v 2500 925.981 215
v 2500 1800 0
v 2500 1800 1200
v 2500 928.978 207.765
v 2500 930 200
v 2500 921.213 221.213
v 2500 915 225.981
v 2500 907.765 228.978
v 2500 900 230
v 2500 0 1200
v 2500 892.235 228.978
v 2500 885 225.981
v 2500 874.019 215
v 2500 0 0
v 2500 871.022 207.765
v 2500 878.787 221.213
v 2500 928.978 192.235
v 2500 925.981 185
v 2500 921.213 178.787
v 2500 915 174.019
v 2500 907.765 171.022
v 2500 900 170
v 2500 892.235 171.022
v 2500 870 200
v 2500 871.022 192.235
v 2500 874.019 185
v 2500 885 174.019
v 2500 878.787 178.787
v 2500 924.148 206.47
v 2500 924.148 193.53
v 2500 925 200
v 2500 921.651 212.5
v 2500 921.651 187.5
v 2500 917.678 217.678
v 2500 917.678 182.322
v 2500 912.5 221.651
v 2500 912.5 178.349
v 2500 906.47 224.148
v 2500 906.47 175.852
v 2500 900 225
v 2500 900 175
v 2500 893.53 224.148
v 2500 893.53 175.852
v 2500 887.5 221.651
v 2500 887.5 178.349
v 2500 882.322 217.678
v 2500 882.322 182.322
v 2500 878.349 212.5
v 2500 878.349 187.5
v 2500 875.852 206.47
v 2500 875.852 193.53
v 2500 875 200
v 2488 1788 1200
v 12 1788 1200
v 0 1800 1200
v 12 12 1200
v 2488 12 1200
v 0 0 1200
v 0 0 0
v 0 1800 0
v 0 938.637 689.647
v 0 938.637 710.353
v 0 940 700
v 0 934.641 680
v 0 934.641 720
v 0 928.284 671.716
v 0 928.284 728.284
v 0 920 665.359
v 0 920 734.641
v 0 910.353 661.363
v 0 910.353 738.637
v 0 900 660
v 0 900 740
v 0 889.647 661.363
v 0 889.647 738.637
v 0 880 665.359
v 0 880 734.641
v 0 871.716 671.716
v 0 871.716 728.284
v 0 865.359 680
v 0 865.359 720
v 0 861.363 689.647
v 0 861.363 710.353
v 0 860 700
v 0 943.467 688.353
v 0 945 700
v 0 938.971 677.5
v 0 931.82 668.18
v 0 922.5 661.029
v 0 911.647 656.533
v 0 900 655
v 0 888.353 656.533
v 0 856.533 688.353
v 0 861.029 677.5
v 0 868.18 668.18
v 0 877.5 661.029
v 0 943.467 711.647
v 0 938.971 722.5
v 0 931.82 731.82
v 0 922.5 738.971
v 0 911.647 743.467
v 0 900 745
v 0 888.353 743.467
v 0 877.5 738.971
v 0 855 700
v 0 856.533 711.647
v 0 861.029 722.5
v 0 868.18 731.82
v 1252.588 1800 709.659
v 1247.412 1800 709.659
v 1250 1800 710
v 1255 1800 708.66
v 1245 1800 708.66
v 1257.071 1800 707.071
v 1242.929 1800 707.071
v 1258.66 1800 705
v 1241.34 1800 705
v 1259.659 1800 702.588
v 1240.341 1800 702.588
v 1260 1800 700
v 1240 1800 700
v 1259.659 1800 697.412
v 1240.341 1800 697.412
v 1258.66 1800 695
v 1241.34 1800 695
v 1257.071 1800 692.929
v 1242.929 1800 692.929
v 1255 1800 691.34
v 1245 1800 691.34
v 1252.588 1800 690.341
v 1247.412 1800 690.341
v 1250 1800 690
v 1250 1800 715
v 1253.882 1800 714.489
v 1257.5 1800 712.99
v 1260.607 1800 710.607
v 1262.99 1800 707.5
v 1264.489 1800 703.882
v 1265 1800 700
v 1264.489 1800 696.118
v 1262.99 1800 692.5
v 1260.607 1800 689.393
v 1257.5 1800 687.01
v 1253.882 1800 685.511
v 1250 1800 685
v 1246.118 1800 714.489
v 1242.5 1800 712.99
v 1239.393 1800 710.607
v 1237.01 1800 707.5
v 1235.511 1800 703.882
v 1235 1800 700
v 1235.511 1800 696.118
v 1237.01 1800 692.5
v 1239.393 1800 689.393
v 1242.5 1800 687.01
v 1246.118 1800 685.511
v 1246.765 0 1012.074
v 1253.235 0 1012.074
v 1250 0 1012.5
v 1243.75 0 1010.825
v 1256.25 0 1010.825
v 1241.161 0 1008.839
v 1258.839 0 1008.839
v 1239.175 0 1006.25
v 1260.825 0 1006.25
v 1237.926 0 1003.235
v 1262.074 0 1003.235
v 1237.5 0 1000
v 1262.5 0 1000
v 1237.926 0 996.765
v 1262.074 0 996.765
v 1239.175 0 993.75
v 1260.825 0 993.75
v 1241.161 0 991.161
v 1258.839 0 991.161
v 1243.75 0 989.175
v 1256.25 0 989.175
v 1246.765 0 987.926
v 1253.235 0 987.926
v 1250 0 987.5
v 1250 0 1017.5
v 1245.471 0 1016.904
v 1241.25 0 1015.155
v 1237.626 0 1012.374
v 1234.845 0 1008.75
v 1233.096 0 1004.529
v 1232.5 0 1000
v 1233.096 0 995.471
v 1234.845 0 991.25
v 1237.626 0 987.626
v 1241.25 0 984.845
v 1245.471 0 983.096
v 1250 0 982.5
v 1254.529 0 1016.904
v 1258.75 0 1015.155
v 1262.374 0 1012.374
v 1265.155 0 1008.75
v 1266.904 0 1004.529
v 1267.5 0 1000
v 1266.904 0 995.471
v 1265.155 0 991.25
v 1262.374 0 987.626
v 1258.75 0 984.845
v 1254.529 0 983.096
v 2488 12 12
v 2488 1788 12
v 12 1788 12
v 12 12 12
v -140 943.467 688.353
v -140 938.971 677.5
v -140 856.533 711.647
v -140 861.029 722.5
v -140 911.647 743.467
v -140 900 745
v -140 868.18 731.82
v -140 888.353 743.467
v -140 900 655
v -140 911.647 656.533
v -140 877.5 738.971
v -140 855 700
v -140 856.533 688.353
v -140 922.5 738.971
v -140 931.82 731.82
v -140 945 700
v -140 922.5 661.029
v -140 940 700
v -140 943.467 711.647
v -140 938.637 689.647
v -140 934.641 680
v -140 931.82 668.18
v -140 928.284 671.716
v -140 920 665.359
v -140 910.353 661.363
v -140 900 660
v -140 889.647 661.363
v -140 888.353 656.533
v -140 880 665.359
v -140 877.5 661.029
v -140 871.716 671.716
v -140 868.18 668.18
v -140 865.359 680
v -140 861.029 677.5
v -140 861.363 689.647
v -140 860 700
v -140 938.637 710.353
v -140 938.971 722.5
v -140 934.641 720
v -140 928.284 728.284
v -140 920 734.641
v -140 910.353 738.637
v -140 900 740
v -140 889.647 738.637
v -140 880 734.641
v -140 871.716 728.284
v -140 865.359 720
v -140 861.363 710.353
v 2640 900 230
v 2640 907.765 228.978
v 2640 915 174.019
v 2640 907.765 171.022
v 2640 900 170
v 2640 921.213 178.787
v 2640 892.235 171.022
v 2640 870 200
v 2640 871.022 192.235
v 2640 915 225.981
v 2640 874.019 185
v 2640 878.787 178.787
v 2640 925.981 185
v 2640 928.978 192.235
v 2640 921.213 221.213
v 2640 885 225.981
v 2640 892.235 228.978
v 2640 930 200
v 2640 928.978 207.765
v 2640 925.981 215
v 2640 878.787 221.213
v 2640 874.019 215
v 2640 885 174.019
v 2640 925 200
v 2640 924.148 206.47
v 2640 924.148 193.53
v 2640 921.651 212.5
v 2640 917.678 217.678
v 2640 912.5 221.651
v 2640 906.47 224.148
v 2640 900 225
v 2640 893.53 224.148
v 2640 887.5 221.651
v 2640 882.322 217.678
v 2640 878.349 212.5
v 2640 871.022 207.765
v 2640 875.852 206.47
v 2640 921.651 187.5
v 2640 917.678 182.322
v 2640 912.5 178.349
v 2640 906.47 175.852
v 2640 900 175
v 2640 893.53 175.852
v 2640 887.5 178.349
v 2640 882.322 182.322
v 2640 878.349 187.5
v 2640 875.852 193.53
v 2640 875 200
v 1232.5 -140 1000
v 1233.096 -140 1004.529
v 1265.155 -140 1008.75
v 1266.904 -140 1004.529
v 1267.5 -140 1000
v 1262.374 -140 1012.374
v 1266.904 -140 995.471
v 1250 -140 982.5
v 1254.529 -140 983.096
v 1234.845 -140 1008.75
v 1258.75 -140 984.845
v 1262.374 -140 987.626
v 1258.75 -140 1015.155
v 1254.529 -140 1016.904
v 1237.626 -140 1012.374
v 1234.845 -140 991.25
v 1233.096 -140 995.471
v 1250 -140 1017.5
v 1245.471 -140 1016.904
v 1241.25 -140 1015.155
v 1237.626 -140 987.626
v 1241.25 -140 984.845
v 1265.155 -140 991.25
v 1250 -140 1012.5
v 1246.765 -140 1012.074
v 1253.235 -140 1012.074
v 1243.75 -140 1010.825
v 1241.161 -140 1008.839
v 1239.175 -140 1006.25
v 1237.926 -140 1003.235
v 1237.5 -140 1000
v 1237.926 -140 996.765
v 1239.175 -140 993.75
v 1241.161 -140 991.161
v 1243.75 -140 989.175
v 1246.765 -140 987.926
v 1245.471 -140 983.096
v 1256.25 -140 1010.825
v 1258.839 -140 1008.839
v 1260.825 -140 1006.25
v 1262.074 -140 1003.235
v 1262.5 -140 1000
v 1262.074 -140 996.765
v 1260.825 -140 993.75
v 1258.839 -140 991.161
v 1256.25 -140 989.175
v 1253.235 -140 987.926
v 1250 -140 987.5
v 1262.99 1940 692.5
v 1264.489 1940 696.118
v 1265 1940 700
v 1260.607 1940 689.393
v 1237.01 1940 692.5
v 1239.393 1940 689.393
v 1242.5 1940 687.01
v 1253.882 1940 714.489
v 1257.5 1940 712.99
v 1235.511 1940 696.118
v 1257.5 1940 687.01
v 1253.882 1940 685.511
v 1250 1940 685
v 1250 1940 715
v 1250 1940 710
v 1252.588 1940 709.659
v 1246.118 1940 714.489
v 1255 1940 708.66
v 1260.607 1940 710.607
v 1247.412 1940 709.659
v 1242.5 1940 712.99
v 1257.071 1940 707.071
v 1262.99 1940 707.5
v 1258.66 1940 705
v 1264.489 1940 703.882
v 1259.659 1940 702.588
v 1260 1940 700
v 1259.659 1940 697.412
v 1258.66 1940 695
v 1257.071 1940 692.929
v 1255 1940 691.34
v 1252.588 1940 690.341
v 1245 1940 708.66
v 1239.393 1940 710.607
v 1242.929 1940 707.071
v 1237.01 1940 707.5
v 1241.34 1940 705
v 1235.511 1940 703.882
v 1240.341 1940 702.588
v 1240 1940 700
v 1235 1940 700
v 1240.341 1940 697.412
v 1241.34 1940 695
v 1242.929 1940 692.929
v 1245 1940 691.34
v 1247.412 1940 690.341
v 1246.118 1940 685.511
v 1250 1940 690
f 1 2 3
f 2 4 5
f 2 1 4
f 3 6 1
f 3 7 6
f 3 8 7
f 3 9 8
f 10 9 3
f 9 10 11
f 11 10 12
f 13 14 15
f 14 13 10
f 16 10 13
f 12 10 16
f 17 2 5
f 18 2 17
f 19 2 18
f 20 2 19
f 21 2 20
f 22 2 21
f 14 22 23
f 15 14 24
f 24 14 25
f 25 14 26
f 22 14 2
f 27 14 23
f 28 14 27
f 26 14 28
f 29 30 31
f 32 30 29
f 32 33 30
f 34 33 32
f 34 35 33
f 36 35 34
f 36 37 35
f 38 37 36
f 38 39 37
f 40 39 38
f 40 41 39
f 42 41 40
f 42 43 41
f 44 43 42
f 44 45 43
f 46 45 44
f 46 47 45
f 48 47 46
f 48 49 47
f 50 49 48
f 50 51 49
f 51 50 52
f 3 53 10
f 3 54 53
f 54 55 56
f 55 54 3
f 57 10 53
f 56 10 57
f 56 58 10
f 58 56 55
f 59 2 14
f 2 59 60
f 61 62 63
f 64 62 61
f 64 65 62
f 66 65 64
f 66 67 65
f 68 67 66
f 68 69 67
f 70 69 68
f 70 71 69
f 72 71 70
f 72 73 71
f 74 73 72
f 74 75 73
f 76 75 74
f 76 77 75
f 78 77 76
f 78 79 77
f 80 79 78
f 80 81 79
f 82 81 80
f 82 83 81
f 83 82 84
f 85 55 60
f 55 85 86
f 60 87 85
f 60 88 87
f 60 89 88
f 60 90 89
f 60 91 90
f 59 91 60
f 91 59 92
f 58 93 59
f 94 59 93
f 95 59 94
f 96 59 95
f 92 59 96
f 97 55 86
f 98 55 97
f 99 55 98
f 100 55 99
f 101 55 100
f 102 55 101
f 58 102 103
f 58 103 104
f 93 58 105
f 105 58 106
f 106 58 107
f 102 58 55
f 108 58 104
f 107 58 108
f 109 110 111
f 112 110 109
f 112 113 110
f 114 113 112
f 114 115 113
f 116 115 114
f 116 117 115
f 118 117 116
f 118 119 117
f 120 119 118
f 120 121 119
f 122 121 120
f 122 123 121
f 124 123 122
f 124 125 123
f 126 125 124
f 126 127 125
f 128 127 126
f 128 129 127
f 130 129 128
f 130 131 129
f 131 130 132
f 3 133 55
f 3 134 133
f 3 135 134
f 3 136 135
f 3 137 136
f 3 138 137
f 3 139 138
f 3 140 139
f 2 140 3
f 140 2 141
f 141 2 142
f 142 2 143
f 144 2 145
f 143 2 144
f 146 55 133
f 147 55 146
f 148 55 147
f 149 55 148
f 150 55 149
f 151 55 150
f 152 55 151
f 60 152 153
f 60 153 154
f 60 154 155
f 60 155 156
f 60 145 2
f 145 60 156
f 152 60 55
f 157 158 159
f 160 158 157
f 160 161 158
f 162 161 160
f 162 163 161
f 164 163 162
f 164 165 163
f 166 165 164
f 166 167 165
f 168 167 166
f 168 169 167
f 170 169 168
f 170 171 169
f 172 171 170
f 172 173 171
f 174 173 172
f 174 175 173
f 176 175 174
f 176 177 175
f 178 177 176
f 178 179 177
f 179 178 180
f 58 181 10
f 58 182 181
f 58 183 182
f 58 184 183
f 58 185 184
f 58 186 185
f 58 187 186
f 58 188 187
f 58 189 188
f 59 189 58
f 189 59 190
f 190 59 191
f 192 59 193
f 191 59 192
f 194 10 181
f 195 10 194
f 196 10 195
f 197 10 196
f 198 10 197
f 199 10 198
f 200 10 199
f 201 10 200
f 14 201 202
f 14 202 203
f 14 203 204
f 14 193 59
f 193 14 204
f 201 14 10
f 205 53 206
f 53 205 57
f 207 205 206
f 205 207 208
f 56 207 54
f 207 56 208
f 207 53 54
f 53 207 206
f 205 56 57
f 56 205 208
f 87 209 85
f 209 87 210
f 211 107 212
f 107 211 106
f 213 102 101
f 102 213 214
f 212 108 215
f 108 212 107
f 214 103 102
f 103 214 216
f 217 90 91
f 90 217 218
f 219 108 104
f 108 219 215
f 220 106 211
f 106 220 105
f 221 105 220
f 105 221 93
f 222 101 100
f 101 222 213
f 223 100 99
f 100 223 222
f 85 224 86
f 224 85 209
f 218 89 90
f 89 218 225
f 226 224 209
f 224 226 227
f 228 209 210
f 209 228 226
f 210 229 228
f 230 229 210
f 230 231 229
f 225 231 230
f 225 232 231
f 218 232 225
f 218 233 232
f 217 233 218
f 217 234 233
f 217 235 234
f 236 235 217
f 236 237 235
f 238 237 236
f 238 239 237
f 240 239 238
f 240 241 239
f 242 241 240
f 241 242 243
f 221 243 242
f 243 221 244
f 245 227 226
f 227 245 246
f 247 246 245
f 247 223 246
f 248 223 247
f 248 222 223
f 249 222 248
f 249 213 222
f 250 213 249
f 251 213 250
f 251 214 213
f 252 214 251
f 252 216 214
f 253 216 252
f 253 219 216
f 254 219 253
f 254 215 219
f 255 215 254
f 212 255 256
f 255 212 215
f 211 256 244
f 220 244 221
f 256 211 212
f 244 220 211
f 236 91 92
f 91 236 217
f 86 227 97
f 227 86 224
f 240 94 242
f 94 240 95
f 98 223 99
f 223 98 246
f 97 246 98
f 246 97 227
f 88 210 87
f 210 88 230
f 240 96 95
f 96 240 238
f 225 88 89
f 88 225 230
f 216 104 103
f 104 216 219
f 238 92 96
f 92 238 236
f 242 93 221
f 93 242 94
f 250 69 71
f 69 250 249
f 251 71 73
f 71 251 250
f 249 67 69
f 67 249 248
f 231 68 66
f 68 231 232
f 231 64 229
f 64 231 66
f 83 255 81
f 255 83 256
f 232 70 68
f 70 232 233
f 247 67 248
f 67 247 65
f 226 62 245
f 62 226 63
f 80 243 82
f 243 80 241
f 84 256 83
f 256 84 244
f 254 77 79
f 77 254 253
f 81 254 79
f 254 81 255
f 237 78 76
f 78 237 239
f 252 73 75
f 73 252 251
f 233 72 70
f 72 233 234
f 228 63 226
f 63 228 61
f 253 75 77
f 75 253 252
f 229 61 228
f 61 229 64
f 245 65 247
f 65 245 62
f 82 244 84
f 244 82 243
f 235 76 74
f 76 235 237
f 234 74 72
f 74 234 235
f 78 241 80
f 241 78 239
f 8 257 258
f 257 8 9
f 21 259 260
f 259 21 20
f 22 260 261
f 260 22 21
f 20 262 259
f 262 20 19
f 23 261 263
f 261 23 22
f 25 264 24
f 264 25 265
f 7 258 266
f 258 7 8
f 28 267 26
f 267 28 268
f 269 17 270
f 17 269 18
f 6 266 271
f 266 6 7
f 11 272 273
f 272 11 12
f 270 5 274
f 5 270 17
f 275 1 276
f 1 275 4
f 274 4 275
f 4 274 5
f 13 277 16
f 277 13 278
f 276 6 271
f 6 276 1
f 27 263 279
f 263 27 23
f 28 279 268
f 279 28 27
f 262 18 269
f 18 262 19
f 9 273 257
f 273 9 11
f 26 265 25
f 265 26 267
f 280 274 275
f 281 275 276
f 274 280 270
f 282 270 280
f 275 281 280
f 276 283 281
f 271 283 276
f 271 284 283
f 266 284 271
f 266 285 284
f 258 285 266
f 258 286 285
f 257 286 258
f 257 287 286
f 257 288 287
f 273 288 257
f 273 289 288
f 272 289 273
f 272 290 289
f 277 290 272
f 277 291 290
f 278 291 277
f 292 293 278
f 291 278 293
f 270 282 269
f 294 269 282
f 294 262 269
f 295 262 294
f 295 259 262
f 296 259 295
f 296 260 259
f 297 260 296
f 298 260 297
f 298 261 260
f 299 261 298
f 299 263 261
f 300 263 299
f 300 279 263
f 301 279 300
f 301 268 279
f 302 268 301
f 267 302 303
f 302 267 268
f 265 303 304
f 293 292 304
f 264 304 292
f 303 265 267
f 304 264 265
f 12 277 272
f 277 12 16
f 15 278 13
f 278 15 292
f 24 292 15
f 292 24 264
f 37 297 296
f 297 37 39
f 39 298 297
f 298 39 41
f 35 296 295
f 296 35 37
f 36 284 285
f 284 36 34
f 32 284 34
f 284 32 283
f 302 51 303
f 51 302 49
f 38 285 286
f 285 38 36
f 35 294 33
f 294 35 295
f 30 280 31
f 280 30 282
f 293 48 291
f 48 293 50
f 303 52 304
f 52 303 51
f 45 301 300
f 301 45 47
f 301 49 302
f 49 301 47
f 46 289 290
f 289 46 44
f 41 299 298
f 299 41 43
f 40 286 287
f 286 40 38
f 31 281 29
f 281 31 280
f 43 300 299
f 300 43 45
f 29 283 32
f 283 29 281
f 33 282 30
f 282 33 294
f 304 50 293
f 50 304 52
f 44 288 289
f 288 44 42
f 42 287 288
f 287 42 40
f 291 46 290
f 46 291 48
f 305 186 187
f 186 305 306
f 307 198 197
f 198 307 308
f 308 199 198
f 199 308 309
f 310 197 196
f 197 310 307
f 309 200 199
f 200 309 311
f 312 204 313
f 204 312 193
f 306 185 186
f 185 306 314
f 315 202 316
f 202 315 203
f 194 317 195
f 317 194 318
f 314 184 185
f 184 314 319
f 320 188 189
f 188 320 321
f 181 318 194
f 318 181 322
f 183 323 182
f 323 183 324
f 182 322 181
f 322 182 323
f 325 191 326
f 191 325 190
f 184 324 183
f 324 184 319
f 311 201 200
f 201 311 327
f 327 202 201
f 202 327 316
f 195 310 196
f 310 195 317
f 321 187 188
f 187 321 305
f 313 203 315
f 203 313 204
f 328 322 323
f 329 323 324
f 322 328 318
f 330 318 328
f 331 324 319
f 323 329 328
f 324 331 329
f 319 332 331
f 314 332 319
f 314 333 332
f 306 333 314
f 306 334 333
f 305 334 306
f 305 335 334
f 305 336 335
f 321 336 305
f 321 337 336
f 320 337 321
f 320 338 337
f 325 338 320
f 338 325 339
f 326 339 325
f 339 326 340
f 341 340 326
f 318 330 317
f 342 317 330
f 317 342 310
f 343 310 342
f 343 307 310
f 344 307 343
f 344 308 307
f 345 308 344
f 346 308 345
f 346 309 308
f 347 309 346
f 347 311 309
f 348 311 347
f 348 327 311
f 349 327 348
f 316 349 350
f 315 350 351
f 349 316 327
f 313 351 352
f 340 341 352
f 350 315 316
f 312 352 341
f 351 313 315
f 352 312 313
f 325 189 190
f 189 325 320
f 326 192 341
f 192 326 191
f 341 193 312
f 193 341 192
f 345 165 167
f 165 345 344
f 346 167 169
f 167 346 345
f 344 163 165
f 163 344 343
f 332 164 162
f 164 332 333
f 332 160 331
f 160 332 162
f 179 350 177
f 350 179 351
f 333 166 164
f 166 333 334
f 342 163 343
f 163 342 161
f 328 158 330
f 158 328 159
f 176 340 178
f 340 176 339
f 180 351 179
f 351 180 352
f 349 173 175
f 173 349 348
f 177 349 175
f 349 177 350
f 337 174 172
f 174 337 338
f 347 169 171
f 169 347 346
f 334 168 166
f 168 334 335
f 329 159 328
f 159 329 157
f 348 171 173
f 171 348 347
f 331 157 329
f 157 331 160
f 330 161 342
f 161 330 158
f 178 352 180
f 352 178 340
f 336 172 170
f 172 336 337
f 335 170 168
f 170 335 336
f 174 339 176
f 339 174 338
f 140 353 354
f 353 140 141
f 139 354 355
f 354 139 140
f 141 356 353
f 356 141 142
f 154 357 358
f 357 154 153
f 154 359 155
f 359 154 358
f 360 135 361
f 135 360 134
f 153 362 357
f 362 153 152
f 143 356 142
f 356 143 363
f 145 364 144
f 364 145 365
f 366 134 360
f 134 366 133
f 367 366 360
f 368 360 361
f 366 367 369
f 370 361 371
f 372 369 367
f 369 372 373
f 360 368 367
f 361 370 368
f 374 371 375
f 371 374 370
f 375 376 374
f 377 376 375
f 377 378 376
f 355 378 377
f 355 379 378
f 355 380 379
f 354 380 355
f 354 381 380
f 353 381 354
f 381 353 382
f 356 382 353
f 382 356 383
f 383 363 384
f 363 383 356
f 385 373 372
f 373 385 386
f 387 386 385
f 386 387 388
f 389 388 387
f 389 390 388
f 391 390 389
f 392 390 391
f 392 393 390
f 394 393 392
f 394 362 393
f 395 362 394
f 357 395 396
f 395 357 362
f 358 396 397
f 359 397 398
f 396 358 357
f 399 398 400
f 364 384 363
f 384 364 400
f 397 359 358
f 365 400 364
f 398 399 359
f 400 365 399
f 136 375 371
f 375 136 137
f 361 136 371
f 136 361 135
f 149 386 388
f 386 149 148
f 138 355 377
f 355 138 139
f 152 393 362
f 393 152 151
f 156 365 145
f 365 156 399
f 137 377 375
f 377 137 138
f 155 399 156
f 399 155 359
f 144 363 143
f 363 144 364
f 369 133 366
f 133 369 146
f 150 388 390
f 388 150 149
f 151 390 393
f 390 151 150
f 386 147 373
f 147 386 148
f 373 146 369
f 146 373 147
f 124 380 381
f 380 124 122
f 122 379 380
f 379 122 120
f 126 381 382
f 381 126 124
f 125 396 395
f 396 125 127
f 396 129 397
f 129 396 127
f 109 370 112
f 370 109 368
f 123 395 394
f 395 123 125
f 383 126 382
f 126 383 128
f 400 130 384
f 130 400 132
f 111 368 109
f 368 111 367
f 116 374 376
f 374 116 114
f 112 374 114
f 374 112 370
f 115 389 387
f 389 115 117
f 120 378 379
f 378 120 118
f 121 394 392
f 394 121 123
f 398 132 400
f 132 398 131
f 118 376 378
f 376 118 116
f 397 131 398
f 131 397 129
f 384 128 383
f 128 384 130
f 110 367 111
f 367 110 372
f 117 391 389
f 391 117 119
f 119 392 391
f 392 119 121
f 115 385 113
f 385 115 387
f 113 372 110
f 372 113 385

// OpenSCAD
// file: ../params.scad
// Shared millimetre parameters. Keep in lockstep with freecad/params.py.
// Module scale: 150 kg/day wet train. Walls are CPVC sheet, not metal.

$fn = 36;

WALL        = 12;     // CPVC sheet thickness
FLOOR       = 16;     // floor plate (trough sits on this)

// LEACH CSTR 1 — inside liquor box
CSTR_L      = 2000;
CSTR_W      = 1200;
CSTR_H      = 1400;   // liquid + freeboard
FREEBOARD   = 200;

// CSTR 2 weir (same vessel, +X wall)
WEIR_W      = 450;
WEIR_CREST  = CSTR_H - FREEBOARD;   // from inner floor
WEIR_SLOT_H = 80;
WEIR_LIP    = 120;    // external spout projection

// CSTR 3 floor auger — injection-molded PVC / FG
AUGER_D     = 140;    // flight OD
AUGER_SHAFT = 40;
AUGER_PITCH = 110;
AUGER_TROUGH_W = 180;
AUGER_TROUGH_H = 110;
AUGER_OFFSET_Y = 280; // trough centreline from inner -Y wall
AUGER_INCLINE  = 28;  // deg, lifts out of liquor toward +X

// mixer / nozzles (lid)
MIXER_D     = 50;
GAS_D       = 80;     // acid-gas takeoff
DROP_X      = 80;     // inner-X of shred drop slot
DROP_L      = 400;
DROP_W      = 250;
DROP_COAM   = 80;     // raised coaming around the slot

// LEACHATE PUMP / coarse strainer — −X wall, opposite the weir
PUMP_D      = 80;     // DN80
PUMP_Z      = 450;    // centreline above inner floor (submerged)
PUMP_Y      = 900;    // centreline from inner −Y (away from auger)
STRAINER_L  = 180;
STRAINER_W  = 140;
STRAINER_H  = 160;

// mezzanine feed train
MEZZ_H      = 2200;   // platform top above tank outer floor
MEZZ_L      = 1600;   // platform length in −X
MEZZ_THK    = 12;
HOPPER_L    = 700;
HOPPER_W    = 600;
HOPPER_H    = 800;
SHRED_L     = 500;
SHRED_W     = 500;
SHRED_H     = 450;
CONV_W      = 240;
CONV_H      = 120;
CONV_PLATE  = 6;      // trough plate
CONV_FLANGE = 40;
CONV_SPRING_D = 50;
CONV_SPRING_H = 80;
CONV_BOLT   = 10;     // M10 clearance
CONV_LEN    = 1800;   // default standalone length; plant instance is computed
DUST_D      = 150;    // dust-hood outlet to DUST header
AUGER_LIFT_L = 700;

// dewater belts + split (Phase A 4–6)
FDEW_L      = 1800;
FDEW_W      = 450;
FDEW_H      = 80;
FDEW_RISE   = 120;    // solids end higher so liquor runs back to weir
SDEW_L      = 1400;
SDEW_W      = 220;
SDEW_H      = 80;
SPLIT_L     = 600;
SPLIT_W     = 500;
SPLIT_H     = 400;
STUB_L      = 400;
STUB_W      = 300;
STUB_H      = 250;

// EW funnel cell
EW_L        = 600;    // along aisle (overflow direction)
EW_W        = 420;    // anode-cathode depth
EW_H        = 650;    // rectangular body
EW_FUNNEL_H = 220;
EW_VALVE_D  = 50;
EW_VALVE_L  = 60;
EW_MEM_T    = 4;      // CEM
EW_SLOT     = 10;     // membrane cassette slot
EW_PITCH    = 750;    // aisle spacing, centre to centre
AISLE_X0    = 200;
AISLE_Y     = -(EW_W + 2*WALL) - 400;
AISLE_Z     = 400;
BUND_H      = 150;
BUND_PAD    = 250;
SUMP_L      = 400;
SUMP_W      = 400;
SUMP_H      = 300;
VDF_D       = 700;
VDF_L       = 900;
PAIL_W      = 180;
HDR_D       = 80;
HDR_Z       = 1400;
PYRO_D      = 320;
PYRO_L      = 2800;

// Campus envelopes — lockstep with freecad/params.py
FARM_X=12000; FARM_Y=8000; FARM_L=12000; FARM_W=8000; FARM_H=4500;
FAB_X=12000;  FAB_Y=-6000; FAB_L=8000;   FAB_W=6000;  FAB_H=4000;
HAB_X=-8000;  HAB_Y=8000;  HAB_L=8000;   HAB_W=6000;  HAB_H=3200;
CRYO_X=-6000; CRYO_Y=-4000; CRYO_L=4000; CRYO_W=3000; CRYO_H=3000;
MFG_X=2000;   MFG_Y=9000;  MFG_L=6000;   MFG_W=4000;  MFG_H=3500;

LIFE_Z_GREY=900; LIFE_Z_UPW=1100; LIFE_Z_ETCH=1300;
LIFE_Z_O2=2800; LIFE_Z_N2=3000; LIFE_Z_CO2=3200;
LIFE_D_GREY=50; LIFE_D_UPW=40; LIFE_D_ETCH=32;
LIFE_D_GAS=25; LIFE_D_CO2=40;
// main file
// FARM SUMP — S1–S4.
include <../params.scad>;
$fn = 24;
L=2500; W=1800; H=1200; T=12;

module stub(d, l=140) {
    difference() {
        cylinder(h=l, d=d+10);
        translate([0,0,-1]) cylinder(h=l+2, d=d);
    }
}

module mfg_farm_sump() {
    difference() {
        cube([L, W, H]);
        translate([T, T, T]) cube([L-2*T, W-2*T, H]);
    }
    translate([0, W/2, 700]) rotate([0,-90,0]) stub(80); // S1
    translate([L, W/2, 200]) rotate([0,90,0]) stub(50);  // S2 HDR_GREY
    translate([L/2, 0, 1000]) rotate([90,0,0]) stub(25); // S3 UPW
    translate([L/2, W, 700]) rotate([-90,0,0]) stub(20); // S4 dose
}

mfg_farm_sump();
